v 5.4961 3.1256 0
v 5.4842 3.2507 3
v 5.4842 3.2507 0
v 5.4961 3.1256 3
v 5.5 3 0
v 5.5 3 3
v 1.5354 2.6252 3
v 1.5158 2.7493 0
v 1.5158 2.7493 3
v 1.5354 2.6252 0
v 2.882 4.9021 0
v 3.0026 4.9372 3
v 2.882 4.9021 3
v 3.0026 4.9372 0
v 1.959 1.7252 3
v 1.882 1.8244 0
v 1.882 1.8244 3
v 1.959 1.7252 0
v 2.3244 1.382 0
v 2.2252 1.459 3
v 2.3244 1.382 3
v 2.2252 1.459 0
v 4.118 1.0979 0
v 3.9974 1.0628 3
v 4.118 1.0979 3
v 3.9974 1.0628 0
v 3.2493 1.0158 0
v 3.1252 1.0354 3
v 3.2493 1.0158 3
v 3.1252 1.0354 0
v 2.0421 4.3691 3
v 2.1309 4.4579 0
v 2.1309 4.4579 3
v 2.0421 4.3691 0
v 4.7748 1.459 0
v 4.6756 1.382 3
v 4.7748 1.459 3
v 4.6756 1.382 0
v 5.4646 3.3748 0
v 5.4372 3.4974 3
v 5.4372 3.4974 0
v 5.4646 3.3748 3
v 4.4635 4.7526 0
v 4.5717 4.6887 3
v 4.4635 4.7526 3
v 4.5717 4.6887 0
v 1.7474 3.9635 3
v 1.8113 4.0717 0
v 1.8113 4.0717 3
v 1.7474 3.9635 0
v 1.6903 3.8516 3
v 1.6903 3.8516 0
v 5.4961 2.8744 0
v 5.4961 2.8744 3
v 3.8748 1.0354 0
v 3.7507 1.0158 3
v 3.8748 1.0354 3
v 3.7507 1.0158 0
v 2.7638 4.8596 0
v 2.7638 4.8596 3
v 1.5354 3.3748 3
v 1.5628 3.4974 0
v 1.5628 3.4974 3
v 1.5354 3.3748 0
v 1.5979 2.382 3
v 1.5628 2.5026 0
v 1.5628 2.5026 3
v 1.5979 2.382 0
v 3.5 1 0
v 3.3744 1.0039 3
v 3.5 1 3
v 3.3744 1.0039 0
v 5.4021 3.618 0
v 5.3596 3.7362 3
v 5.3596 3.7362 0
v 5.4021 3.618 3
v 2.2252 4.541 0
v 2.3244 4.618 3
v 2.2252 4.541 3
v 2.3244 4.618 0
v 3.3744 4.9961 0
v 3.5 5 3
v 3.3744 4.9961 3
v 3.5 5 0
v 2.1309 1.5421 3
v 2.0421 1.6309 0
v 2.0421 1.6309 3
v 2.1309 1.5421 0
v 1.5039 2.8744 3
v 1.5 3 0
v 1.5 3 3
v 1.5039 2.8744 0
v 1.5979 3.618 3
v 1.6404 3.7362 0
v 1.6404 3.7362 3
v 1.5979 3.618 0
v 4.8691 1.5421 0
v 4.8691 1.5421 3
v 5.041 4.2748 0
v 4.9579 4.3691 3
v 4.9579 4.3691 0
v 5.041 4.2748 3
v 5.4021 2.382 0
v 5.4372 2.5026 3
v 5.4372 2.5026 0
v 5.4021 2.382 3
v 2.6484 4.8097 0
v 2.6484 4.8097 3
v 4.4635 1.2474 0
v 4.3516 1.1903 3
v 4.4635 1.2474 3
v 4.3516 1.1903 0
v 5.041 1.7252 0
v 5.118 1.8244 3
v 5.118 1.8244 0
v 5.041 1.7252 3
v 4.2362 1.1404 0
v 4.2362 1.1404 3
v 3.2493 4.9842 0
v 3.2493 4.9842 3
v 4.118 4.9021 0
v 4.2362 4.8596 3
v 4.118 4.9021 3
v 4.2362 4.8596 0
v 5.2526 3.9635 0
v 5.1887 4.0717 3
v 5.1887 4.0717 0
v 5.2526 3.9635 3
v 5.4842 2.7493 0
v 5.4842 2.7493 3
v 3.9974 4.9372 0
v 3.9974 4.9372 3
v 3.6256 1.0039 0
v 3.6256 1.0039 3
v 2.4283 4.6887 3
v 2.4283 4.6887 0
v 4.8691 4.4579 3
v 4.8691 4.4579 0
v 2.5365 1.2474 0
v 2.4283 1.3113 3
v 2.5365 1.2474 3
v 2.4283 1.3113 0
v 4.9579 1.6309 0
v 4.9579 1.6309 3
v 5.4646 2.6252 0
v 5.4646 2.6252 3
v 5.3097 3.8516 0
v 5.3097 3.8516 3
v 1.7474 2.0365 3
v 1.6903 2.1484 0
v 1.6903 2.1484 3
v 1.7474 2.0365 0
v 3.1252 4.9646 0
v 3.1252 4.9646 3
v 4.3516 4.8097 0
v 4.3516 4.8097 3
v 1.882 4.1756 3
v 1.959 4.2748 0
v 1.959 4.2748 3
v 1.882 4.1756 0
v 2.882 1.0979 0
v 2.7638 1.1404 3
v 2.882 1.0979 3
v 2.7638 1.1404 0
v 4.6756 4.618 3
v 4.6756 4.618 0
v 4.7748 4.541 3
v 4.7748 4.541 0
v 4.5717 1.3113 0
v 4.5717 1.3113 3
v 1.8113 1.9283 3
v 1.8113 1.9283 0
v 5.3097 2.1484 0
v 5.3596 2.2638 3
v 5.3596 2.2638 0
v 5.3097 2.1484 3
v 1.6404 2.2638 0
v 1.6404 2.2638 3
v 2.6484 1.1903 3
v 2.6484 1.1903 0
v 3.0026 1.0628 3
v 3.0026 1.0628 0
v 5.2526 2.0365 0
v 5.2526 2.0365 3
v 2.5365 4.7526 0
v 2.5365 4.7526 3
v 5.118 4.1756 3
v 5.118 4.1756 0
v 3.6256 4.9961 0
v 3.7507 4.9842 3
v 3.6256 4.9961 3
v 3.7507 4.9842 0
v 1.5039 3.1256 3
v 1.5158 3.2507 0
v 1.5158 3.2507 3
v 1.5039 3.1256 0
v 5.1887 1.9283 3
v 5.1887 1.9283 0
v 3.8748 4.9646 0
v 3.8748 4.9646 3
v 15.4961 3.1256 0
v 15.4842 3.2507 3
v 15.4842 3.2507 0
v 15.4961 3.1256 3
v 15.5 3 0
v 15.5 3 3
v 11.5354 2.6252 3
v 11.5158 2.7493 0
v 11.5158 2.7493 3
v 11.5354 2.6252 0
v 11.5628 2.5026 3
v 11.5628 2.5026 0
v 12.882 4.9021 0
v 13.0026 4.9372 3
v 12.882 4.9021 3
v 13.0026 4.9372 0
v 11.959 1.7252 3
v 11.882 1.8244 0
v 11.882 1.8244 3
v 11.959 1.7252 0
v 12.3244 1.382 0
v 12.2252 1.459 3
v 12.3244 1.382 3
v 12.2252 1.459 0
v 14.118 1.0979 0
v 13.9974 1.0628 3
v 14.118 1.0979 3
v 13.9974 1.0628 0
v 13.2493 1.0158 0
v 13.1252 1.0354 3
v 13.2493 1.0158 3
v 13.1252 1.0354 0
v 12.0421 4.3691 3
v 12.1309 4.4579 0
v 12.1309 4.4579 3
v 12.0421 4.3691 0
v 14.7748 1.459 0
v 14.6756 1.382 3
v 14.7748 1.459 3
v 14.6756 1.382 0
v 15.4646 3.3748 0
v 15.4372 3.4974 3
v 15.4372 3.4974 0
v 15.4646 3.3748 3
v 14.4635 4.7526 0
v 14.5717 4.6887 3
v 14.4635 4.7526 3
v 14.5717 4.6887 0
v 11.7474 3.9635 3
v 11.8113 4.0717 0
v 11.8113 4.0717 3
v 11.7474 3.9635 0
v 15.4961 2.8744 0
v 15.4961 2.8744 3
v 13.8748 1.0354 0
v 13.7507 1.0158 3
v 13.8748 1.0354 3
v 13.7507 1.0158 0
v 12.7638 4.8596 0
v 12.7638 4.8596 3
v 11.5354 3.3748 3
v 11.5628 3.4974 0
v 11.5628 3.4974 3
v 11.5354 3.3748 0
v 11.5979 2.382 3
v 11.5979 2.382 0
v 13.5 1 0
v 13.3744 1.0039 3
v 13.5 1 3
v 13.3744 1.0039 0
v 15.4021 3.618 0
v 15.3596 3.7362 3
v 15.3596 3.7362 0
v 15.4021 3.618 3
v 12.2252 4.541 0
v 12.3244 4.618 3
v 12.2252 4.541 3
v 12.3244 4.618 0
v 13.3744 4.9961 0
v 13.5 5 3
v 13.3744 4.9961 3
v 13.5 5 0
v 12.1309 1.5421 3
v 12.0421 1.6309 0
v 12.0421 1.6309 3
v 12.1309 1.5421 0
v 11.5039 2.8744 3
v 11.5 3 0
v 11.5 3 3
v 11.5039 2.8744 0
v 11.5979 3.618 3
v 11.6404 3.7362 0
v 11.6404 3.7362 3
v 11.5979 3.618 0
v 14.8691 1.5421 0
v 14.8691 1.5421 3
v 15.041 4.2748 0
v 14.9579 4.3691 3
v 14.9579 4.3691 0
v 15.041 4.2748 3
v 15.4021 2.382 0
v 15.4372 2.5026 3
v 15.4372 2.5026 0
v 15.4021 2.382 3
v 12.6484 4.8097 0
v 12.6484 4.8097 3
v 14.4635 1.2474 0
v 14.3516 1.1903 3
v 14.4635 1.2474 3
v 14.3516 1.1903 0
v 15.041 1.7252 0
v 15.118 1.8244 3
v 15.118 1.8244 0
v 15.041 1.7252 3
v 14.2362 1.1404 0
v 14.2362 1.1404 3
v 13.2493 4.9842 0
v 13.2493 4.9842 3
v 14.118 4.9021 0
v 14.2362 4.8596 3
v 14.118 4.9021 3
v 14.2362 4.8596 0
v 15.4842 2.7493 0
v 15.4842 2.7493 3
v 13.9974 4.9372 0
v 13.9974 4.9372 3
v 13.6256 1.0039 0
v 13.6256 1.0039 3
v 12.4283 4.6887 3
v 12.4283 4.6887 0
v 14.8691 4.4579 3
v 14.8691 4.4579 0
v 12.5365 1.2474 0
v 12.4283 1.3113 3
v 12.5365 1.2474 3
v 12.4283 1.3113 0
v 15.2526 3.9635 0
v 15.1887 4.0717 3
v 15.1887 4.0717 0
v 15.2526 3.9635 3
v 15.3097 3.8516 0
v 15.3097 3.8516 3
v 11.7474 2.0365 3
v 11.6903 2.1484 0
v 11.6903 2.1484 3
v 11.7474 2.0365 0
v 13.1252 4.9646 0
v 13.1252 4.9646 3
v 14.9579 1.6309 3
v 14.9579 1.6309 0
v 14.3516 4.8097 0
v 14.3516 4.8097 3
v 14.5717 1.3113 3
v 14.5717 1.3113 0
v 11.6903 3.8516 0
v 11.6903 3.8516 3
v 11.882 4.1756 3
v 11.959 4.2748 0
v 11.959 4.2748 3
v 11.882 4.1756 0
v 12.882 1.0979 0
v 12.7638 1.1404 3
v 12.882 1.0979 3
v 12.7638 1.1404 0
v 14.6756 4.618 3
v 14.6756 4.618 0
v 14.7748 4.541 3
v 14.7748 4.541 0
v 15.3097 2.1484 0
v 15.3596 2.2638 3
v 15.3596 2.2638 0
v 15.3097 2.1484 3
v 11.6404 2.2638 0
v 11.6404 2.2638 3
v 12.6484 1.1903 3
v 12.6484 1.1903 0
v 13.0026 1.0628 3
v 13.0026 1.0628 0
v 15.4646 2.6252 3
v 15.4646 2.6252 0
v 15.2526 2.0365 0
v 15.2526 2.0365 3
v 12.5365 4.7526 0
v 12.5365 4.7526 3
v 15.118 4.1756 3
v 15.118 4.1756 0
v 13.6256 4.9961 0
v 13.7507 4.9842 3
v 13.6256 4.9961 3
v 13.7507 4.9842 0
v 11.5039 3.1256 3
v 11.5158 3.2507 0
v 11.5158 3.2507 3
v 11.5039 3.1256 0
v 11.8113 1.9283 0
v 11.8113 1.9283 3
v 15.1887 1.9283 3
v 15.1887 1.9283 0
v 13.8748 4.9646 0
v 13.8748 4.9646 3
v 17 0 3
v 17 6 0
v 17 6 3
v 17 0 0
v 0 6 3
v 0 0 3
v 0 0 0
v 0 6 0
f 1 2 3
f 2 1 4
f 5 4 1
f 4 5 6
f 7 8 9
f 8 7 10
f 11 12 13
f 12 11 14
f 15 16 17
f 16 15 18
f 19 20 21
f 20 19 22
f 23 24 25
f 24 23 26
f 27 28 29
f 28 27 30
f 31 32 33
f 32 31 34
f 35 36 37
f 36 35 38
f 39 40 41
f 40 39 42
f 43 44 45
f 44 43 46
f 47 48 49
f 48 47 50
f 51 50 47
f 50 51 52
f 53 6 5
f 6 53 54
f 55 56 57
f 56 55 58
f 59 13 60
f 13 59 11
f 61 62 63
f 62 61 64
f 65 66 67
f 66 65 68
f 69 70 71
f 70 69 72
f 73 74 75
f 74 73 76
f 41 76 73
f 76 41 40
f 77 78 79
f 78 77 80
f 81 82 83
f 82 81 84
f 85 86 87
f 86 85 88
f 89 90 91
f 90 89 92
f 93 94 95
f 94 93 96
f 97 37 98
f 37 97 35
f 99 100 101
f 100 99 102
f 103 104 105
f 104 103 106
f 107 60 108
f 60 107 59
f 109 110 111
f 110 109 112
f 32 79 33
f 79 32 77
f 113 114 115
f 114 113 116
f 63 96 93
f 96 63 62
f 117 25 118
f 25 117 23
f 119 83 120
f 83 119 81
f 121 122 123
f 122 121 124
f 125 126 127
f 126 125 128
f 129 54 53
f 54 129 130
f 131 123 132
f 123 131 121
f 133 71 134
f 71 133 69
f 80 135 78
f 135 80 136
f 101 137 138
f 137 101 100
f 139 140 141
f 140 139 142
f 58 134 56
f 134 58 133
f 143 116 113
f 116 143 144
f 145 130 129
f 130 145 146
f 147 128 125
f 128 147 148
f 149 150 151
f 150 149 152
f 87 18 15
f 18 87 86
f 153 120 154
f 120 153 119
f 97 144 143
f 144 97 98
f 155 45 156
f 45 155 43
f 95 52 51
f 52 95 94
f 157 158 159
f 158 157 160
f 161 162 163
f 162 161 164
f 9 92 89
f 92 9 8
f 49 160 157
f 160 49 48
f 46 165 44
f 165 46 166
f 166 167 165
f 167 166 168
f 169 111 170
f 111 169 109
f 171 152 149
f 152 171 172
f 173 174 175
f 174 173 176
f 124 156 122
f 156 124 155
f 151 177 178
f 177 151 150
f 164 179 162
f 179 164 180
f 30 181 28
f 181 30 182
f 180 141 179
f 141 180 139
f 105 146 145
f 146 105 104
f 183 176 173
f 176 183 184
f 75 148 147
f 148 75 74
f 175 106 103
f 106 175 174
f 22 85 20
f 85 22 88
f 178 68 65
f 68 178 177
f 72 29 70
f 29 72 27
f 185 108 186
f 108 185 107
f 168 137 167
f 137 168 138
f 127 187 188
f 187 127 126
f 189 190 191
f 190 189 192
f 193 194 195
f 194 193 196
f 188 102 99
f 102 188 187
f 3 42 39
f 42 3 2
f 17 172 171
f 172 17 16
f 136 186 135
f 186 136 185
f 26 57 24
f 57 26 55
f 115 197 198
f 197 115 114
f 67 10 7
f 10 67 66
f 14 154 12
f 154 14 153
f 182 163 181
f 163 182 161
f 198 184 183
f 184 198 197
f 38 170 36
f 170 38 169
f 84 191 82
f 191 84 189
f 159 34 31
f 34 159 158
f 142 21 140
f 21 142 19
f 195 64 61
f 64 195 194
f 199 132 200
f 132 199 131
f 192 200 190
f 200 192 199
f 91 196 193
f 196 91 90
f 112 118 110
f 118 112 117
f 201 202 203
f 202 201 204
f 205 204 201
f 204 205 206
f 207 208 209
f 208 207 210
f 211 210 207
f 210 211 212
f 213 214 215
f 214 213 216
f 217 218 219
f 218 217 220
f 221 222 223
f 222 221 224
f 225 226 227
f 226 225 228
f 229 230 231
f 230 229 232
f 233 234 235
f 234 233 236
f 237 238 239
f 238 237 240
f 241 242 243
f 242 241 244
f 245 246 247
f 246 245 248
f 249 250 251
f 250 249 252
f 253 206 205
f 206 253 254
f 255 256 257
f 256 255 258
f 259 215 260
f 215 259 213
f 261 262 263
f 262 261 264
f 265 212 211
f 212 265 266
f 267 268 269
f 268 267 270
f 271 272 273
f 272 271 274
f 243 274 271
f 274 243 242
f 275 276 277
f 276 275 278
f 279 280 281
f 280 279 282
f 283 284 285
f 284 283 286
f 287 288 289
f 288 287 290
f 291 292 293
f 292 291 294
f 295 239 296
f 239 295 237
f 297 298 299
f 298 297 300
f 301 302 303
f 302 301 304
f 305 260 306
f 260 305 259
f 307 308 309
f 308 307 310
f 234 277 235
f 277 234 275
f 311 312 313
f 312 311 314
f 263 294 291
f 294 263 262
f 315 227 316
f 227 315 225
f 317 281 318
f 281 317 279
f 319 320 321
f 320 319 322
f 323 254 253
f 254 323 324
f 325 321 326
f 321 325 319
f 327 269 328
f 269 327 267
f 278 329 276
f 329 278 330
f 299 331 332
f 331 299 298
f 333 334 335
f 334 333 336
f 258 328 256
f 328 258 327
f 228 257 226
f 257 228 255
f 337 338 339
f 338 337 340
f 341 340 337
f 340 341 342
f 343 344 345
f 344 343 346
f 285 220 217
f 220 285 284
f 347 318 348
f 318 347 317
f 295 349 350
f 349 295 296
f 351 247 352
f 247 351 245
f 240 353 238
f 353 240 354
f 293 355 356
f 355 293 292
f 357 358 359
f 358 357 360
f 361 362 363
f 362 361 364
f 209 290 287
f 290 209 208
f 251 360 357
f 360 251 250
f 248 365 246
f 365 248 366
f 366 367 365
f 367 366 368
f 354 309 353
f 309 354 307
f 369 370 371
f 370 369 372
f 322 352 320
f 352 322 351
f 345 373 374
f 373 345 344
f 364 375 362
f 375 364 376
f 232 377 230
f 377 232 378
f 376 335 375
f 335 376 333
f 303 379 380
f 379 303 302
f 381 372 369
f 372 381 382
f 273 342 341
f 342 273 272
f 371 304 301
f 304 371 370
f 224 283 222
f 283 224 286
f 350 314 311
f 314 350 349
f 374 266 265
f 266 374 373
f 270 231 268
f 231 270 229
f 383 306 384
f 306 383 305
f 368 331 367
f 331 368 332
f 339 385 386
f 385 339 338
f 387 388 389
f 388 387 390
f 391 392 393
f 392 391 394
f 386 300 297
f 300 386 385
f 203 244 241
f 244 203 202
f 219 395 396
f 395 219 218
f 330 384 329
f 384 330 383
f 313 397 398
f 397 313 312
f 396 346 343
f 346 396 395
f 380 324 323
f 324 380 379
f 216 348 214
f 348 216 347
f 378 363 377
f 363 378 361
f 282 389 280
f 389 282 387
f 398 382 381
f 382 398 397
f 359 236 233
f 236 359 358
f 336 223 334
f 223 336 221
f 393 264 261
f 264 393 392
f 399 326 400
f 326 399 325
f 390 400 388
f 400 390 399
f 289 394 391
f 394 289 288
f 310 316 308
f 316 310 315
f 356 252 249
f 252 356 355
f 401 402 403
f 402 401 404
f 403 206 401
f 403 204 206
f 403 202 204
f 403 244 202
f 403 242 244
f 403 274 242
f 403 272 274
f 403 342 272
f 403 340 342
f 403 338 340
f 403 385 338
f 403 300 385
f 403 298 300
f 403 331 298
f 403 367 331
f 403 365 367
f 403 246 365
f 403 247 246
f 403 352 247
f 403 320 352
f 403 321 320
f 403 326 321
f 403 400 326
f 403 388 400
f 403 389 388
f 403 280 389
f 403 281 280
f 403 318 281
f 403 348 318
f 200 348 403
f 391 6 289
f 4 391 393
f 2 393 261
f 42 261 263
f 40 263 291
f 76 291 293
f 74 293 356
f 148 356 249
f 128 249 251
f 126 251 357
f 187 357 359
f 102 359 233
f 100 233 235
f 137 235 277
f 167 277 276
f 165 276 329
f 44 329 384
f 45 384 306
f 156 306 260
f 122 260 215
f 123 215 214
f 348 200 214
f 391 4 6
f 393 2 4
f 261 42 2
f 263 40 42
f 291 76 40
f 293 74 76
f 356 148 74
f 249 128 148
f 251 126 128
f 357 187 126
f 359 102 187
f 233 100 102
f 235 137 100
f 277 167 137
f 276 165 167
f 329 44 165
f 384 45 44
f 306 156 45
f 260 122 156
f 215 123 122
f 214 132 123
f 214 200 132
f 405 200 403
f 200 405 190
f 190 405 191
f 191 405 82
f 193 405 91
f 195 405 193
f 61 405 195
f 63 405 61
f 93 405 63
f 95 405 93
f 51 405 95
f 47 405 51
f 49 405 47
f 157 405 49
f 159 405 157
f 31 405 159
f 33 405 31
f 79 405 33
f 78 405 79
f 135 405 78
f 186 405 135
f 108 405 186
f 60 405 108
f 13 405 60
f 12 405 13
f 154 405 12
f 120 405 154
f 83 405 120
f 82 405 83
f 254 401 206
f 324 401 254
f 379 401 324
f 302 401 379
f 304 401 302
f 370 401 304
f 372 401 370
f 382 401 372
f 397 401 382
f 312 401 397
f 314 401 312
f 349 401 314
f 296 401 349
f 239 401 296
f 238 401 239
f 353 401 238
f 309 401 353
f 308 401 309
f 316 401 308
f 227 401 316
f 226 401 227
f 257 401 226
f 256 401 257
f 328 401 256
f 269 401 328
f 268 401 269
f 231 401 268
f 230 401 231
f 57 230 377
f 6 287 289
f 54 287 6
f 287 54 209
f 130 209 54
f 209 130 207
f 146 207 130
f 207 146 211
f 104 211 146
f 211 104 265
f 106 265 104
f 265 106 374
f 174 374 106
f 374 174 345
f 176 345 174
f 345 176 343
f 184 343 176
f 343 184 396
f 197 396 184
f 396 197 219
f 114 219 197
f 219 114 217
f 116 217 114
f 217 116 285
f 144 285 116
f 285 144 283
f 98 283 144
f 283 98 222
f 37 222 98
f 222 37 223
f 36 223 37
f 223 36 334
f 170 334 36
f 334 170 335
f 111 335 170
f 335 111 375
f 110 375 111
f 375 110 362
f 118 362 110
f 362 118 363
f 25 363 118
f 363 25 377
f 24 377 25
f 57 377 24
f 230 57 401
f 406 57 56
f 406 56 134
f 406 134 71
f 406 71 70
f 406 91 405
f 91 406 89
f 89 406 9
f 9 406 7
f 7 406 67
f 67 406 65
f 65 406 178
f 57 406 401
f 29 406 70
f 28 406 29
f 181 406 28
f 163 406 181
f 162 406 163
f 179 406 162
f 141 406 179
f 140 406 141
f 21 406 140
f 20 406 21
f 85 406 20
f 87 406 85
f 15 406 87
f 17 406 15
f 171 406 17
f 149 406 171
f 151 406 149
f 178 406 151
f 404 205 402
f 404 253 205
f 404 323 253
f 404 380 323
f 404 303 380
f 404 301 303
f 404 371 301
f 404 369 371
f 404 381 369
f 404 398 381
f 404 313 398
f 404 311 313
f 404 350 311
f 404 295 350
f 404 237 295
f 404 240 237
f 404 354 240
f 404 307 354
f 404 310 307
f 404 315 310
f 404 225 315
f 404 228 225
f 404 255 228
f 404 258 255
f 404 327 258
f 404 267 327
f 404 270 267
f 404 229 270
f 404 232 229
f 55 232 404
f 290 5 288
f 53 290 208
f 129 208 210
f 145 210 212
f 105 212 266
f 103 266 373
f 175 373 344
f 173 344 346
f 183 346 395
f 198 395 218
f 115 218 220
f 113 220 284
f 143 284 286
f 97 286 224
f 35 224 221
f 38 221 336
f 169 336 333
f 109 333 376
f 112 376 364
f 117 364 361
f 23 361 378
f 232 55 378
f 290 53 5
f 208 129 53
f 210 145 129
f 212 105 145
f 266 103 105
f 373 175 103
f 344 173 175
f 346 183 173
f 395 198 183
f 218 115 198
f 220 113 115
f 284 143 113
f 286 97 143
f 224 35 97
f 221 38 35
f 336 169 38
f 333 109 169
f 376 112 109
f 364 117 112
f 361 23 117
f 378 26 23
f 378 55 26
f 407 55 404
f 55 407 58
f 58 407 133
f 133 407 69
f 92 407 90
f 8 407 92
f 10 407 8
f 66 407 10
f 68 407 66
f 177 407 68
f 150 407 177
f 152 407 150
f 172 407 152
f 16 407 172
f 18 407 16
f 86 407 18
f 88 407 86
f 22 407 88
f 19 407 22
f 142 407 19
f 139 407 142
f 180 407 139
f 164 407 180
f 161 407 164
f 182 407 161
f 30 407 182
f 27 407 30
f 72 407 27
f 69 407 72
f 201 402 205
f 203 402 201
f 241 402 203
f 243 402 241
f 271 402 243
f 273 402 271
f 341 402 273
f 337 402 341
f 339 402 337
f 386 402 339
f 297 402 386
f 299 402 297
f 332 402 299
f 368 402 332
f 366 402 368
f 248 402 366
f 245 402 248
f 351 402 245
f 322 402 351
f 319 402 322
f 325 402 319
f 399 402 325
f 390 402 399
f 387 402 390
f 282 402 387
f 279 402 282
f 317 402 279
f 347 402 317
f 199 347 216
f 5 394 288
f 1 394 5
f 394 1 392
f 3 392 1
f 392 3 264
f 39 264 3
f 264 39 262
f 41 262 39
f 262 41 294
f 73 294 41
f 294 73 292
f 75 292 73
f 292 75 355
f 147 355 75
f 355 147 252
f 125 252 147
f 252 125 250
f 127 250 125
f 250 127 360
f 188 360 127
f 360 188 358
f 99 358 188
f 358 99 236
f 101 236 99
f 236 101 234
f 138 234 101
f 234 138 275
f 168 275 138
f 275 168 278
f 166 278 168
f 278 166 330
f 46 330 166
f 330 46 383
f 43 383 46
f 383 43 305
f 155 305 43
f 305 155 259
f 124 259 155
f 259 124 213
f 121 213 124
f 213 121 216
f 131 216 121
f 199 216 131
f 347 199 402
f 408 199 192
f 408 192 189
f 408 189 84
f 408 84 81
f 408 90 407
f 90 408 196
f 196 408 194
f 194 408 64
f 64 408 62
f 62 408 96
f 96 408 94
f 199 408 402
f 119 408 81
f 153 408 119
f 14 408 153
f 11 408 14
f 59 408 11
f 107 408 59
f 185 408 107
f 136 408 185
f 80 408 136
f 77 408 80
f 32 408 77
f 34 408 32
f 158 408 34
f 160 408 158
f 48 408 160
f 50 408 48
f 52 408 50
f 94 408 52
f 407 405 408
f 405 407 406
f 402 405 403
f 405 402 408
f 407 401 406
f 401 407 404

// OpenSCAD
/* Really simple "mending plate" with two #6 holes 
    -- I use this to clamp a GT2 belt, but it probably could be used
    for anything. Al Williams, April 2013 */
// Version 2 - Fixed holes where n>2

// Length of plate (mm)
length=17; // [10:100]
// Width of plate (mm)
width=6; // [5:100]
// Thickness of plate (mm)
thickness=3; // [.5:20]
// Offset from edge/hole spacing (mm)
edgeoffset=3.5	;  // [1:10]
// Number of holes (should be even)
n=2; // [[1:100]
// Hole radius (mm)
hole_radius=2;
loopct=n/2;
difference() {
cube([length,width,thickness]);
for (i=[1:loopct]) {
  translate([edgeoffset*i+2*hole_radius*(i-1),width/2,1]) cylinder(h=thickness*10,r=hole_radius,center=true,$fn=100);
  translate([length-(edgeoffset*i+2*hole_radius*(i-1)),width/2,1]) cylinder(h=thickness*10,r=hole_radius,center=true,$fn=100);
  }
}
